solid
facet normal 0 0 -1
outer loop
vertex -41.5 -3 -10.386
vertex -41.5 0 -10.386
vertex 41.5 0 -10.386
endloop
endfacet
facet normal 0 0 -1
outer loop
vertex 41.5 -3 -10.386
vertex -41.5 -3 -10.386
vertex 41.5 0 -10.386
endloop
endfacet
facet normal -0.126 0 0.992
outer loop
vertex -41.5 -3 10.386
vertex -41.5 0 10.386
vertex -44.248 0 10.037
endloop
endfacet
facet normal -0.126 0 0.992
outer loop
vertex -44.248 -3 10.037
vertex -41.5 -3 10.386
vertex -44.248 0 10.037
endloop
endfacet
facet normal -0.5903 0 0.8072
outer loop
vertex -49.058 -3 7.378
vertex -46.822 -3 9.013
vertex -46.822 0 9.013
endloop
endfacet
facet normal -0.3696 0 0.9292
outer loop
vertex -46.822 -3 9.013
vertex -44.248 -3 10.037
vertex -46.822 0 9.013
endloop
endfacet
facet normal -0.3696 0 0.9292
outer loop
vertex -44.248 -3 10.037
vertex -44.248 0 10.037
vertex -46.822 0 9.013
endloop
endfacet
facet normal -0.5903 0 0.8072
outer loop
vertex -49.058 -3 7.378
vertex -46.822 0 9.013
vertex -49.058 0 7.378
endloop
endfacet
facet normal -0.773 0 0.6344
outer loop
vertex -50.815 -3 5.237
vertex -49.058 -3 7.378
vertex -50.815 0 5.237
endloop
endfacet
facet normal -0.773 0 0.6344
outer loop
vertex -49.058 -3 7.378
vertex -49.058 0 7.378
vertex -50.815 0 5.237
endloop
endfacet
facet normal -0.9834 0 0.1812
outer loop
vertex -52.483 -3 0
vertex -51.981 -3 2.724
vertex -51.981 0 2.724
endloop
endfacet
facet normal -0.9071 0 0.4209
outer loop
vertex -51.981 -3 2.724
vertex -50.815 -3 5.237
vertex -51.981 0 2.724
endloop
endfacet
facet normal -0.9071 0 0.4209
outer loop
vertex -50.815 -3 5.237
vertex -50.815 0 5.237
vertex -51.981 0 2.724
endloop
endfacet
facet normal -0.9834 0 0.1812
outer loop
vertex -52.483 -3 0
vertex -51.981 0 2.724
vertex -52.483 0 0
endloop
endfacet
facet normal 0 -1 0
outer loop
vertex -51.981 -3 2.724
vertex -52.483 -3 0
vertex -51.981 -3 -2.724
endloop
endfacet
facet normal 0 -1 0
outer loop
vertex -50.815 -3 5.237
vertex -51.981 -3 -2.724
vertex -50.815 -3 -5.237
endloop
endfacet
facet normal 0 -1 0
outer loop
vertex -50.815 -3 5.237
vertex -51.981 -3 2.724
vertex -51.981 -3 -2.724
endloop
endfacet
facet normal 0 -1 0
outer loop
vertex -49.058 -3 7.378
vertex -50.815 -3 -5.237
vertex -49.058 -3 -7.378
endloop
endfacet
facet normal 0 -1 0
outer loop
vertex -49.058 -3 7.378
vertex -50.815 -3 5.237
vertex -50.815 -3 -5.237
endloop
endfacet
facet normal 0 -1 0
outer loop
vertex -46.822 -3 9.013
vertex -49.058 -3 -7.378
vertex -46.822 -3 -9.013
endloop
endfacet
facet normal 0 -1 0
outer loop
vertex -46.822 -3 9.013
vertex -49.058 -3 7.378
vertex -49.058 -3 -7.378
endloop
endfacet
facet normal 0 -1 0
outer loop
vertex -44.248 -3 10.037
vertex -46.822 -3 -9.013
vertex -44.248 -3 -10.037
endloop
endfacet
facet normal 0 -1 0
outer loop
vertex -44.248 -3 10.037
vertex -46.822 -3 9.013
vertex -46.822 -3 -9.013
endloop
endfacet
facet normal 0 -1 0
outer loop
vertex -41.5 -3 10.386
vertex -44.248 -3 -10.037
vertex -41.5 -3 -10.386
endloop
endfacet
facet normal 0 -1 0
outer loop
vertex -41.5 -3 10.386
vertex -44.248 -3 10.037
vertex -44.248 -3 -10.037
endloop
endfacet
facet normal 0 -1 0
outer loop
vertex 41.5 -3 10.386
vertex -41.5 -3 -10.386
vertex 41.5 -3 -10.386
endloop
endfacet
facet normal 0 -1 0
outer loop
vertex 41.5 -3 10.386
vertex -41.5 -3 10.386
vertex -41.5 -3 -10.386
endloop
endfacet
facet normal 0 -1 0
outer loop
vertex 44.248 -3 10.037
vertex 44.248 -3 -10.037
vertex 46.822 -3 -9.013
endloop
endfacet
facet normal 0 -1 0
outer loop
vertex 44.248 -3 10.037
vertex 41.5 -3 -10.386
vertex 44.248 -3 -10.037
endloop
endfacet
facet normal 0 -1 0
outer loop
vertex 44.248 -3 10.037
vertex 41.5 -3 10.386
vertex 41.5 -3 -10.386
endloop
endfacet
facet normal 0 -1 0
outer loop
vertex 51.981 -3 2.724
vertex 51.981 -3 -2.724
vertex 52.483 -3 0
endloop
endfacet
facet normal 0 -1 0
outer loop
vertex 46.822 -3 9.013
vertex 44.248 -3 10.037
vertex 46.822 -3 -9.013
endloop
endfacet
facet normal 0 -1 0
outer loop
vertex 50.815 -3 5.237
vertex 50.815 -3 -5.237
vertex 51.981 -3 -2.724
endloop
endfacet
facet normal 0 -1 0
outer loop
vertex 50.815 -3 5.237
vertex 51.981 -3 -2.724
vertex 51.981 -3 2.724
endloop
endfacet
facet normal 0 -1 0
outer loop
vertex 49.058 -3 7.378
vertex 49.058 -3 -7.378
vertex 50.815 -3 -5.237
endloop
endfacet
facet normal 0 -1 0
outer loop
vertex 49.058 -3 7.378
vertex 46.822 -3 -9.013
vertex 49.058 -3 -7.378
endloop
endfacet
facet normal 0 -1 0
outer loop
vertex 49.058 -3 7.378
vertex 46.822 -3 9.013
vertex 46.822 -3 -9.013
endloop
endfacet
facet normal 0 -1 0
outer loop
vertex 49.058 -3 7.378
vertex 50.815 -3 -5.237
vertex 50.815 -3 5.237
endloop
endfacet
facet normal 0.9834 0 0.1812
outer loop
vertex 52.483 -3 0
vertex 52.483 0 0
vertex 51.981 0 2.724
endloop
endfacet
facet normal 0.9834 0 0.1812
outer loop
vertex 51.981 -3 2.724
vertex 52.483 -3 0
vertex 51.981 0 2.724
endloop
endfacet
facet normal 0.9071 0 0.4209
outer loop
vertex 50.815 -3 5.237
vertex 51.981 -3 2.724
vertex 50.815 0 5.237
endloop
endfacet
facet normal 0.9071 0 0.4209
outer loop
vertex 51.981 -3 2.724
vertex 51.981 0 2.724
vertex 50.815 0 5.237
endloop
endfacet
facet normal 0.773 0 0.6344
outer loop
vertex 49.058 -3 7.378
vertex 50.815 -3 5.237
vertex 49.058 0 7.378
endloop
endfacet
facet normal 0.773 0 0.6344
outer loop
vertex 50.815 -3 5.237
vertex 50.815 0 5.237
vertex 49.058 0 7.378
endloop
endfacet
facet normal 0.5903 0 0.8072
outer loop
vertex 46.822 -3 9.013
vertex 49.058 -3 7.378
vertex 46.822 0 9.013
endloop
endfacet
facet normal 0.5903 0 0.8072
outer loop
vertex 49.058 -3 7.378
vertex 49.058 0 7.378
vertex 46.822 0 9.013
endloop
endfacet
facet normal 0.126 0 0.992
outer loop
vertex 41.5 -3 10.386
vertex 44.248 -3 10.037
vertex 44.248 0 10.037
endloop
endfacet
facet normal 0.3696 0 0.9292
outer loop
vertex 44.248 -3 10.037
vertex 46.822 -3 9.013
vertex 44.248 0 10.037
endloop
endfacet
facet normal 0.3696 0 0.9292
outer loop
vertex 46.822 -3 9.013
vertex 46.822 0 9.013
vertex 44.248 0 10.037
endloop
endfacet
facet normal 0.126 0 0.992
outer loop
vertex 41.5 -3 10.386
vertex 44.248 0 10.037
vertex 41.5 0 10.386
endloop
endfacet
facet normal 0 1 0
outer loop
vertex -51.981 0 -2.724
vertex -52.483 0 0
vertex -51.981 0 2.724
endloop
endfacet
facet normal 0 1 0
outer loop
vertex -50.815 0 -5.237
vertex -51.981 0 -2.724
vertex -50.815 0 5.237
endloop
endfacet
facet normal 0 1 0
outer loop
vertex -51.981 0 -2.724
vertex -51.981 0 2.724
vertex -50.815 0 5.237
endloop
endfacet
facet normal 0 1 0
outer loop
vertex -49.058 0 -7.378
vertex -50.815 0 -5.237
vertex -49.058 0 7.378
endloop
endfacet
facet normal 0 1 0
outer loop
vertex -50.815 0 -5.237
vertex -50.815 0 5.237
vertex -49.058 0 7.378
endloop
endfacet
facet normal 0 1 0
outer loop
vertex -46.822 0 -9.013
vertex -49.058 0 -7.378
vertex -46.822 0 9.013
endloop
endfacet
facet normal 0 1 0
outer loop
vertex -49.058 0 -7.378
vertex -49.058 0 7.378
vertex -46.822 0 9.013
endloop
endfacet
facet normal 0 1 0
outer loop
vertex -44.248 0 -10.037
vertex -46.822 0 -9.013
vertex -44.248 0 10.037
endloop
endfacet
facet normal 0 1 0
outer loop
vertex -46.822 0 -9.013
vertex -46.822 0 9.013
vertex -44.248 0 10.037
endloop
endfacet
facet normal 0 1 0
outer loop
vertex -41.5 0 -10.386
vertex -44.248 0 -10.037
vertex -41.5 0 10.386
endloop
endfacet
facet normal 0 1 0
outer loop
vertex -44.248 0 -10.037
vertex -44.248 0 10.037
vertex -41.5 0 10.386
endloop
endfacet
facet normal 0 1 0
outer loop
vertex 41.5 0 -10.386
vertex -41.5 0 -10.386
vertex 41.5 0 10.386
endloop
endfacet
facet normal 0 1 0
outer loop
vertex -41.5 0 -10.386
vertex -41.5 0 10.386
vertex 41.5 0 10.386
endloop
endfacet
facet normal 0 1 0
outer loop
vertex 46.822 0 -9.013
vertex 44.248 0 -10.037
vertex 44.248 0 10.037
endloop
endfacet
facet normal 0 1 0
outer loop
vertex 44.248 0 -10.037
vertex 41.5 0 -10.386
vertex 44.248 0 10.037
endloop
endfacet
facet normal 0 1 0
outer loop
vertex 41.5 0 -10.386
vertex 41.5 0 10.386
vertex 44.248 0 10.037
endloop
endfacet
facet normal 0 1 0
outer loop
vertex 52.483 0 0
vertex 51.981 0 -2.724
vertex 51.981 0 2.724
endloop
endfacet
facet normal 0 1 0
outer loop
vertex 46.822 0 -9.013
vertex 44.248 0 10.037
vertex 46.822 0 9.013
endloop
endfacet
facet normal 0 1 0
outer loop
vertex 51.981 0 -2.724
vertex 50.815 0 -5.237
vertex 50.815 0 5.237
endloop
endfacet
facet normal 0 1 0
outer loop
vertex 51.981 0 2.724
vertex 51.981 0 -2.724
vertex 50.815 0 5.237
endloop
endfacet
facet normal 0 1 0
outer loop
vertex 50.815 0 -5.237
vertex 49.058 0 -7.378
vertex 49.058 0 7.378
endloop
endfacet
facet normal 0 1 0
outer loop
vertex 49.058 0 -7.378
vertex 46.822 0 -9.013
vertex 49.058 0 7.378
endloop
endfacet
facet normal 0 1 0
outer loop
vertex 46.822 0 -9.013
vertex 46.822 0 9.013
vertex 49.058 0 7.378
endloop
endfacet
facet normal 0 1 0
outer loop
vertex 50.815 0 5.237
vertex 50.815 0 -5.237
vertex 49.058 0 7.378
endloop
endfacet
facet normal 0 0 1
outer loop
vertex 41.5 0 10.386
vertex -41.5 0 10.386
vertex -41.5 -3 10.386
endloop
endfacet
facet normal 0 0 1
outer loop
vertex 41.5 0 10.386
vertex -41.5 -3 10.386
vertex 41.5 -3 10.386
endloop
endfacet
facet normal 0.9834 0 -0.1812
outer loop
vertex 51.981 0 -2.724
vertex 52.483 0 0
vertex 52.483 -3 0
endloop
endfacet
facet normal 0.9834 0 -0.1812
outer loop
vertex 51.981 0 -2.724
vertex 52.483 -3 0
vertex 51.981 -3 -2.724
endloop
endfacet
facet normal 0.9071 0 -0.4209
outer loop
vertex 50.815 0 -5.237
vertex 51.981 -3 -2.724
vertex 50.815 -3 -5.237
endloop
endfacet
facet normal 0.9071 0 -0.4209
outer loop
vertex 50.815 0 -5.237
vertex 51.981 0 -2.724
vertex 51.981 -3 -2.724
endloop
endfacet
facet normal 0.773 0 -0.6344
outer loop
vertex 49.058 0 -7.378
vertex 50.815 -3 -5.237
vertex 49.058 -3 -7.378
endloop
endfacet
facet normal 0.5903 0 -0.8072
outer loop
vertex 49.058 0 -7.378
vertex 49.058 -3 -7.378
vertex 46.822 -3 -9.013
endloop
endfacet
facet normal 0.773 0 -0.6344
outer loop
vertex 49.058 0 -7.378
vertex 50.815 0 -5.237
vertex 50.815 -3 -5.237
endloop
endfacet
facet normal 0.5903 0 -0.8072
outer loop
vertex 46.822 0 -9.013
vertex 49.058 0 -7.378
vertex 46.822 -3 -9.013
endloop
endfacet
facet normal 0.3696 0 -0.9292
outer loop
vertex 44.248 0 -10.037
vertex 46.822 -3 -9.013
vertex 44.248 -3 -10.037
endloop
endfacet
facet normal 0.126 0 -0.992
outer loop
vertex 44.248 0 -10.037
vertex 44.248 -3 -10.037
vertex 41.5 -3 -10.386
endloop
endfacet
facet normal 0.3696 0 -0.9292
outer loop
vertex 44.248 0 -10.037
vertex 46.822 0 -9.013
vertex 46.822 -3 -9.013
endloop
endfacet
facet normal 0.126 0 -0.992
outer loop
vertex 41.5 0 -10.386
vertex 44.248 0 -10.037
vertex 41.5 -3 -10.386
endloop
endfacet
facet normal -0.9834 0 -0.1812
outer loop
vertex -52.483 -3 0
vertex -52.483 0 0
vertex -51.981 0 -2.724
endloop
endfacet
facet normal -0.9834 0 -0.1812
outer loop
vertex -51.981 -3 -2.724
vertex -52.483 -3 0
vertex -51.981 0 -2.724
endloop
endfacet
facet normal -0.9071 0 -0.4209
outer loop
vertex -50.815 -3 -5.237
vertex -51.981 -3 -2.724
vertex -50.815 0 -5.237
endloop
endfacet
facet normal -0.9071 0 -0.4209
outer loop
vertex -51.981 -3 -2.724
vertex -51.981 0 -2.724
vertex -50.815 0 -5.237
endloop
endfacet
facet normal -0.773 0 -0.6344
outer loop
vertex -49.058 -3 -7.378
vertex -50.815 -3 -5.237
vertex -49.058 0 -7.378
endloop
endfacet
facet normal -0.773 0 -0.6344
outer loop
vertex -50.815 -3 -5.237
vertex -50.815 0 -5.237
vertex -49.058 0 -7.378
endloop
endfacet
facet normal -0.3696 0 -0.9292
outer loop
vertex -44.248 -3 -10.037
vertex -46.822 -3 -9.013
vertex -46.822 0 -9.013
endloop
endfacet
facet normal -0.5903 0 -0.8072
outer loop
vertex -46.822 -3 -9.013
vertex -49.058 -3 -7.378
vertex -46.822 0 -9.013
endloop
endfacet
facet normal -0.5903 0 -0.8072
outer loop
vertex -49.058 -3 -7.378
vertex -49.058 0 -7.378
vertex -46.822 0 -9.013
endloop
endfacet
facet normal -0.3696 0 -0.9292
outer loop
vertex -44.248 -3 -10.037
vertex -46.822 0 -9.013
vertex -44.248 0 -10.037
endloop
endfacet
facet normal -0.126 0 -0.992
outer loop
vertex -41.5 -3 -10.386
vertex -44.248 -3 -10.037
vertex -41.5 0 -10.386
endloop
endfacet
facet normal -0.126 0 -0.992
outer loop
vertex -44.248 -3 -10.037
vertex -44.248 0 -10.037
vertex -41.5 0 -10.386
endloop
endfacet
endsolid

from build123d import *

# Parameters (mm, degrees)
F0_W        = 105
F0_H        = 20.7723644742
F1_DEPTH    = 3
F2_T1_DEPTH = 58


# Not quite as in the source:
# - a fillet or chamfer that OpenCascade refuses, or shapes differently, is made with other operations: its cross-section is extruded or revolved along the edge and cut away or added


with BuildPart() as f1:
    # F0 (on Front) → F1 (new body)
    with BuildSketch(Plane.XZ):
        Rectangle(F0_W, F0_H)
    extrude(amount=F1_DEPTH)

    # F2: fillet of radius 11 on 4 edges, made by hand

    # F2_s2 → F2_t1 (cut)
    with BuildSketch(Plane.XZ.offset(-27.5)):
        with BuildLine():
            ThreePointArc((-41.5, 10.3861822371), (-49.2781745931, 7.1643568302), (-52.5, -0.6138177629))
            Line((-52.5, -0.6138177629), (-52.5, 10.3861822371))
            Line((-52.5, 10.3861822371), (-41.5, 10.3861822371))
        make_face()
        with BuildLine():
            ThreePointArc((-52.5, 0.6138177629), (-49.2781745931, -7.1643568302), (-41.5, -10.3861822371))
            Line((-41.5, -10.3861822371), (-52.5, -10.3861822371))
            Line((-52.5, -10.3861822371), (-52.5, 0.6138177629))
        make_face()
        with BuildLine():
            ThreePointArc((52.5, -0.6138177629), (49.2781745931, 7.1643568302), (41.5, 10.3861822371))
            Line((41.5, 10.3861822371), (52.5, 10.3861822371))
            Line((52.5, 10.3861822371), (52.5, -0.6138177629))
        make_face()
        with BuildLine():
            ThreePointArc((52.5, 0.6138177629), (49.2781745931, -7.1643568302), (41.5, -10.3861822371))
            Line((41.5, -10.3861822371), (52.5, -10.3861822371))
            Line((52.5, -10.3861822371), (52.5, 0.6138177629))
        make_face()
    extrude(amount=F2_T1_DEPTH, mode=Mode.SUBTRACT)


solid = f1.part
